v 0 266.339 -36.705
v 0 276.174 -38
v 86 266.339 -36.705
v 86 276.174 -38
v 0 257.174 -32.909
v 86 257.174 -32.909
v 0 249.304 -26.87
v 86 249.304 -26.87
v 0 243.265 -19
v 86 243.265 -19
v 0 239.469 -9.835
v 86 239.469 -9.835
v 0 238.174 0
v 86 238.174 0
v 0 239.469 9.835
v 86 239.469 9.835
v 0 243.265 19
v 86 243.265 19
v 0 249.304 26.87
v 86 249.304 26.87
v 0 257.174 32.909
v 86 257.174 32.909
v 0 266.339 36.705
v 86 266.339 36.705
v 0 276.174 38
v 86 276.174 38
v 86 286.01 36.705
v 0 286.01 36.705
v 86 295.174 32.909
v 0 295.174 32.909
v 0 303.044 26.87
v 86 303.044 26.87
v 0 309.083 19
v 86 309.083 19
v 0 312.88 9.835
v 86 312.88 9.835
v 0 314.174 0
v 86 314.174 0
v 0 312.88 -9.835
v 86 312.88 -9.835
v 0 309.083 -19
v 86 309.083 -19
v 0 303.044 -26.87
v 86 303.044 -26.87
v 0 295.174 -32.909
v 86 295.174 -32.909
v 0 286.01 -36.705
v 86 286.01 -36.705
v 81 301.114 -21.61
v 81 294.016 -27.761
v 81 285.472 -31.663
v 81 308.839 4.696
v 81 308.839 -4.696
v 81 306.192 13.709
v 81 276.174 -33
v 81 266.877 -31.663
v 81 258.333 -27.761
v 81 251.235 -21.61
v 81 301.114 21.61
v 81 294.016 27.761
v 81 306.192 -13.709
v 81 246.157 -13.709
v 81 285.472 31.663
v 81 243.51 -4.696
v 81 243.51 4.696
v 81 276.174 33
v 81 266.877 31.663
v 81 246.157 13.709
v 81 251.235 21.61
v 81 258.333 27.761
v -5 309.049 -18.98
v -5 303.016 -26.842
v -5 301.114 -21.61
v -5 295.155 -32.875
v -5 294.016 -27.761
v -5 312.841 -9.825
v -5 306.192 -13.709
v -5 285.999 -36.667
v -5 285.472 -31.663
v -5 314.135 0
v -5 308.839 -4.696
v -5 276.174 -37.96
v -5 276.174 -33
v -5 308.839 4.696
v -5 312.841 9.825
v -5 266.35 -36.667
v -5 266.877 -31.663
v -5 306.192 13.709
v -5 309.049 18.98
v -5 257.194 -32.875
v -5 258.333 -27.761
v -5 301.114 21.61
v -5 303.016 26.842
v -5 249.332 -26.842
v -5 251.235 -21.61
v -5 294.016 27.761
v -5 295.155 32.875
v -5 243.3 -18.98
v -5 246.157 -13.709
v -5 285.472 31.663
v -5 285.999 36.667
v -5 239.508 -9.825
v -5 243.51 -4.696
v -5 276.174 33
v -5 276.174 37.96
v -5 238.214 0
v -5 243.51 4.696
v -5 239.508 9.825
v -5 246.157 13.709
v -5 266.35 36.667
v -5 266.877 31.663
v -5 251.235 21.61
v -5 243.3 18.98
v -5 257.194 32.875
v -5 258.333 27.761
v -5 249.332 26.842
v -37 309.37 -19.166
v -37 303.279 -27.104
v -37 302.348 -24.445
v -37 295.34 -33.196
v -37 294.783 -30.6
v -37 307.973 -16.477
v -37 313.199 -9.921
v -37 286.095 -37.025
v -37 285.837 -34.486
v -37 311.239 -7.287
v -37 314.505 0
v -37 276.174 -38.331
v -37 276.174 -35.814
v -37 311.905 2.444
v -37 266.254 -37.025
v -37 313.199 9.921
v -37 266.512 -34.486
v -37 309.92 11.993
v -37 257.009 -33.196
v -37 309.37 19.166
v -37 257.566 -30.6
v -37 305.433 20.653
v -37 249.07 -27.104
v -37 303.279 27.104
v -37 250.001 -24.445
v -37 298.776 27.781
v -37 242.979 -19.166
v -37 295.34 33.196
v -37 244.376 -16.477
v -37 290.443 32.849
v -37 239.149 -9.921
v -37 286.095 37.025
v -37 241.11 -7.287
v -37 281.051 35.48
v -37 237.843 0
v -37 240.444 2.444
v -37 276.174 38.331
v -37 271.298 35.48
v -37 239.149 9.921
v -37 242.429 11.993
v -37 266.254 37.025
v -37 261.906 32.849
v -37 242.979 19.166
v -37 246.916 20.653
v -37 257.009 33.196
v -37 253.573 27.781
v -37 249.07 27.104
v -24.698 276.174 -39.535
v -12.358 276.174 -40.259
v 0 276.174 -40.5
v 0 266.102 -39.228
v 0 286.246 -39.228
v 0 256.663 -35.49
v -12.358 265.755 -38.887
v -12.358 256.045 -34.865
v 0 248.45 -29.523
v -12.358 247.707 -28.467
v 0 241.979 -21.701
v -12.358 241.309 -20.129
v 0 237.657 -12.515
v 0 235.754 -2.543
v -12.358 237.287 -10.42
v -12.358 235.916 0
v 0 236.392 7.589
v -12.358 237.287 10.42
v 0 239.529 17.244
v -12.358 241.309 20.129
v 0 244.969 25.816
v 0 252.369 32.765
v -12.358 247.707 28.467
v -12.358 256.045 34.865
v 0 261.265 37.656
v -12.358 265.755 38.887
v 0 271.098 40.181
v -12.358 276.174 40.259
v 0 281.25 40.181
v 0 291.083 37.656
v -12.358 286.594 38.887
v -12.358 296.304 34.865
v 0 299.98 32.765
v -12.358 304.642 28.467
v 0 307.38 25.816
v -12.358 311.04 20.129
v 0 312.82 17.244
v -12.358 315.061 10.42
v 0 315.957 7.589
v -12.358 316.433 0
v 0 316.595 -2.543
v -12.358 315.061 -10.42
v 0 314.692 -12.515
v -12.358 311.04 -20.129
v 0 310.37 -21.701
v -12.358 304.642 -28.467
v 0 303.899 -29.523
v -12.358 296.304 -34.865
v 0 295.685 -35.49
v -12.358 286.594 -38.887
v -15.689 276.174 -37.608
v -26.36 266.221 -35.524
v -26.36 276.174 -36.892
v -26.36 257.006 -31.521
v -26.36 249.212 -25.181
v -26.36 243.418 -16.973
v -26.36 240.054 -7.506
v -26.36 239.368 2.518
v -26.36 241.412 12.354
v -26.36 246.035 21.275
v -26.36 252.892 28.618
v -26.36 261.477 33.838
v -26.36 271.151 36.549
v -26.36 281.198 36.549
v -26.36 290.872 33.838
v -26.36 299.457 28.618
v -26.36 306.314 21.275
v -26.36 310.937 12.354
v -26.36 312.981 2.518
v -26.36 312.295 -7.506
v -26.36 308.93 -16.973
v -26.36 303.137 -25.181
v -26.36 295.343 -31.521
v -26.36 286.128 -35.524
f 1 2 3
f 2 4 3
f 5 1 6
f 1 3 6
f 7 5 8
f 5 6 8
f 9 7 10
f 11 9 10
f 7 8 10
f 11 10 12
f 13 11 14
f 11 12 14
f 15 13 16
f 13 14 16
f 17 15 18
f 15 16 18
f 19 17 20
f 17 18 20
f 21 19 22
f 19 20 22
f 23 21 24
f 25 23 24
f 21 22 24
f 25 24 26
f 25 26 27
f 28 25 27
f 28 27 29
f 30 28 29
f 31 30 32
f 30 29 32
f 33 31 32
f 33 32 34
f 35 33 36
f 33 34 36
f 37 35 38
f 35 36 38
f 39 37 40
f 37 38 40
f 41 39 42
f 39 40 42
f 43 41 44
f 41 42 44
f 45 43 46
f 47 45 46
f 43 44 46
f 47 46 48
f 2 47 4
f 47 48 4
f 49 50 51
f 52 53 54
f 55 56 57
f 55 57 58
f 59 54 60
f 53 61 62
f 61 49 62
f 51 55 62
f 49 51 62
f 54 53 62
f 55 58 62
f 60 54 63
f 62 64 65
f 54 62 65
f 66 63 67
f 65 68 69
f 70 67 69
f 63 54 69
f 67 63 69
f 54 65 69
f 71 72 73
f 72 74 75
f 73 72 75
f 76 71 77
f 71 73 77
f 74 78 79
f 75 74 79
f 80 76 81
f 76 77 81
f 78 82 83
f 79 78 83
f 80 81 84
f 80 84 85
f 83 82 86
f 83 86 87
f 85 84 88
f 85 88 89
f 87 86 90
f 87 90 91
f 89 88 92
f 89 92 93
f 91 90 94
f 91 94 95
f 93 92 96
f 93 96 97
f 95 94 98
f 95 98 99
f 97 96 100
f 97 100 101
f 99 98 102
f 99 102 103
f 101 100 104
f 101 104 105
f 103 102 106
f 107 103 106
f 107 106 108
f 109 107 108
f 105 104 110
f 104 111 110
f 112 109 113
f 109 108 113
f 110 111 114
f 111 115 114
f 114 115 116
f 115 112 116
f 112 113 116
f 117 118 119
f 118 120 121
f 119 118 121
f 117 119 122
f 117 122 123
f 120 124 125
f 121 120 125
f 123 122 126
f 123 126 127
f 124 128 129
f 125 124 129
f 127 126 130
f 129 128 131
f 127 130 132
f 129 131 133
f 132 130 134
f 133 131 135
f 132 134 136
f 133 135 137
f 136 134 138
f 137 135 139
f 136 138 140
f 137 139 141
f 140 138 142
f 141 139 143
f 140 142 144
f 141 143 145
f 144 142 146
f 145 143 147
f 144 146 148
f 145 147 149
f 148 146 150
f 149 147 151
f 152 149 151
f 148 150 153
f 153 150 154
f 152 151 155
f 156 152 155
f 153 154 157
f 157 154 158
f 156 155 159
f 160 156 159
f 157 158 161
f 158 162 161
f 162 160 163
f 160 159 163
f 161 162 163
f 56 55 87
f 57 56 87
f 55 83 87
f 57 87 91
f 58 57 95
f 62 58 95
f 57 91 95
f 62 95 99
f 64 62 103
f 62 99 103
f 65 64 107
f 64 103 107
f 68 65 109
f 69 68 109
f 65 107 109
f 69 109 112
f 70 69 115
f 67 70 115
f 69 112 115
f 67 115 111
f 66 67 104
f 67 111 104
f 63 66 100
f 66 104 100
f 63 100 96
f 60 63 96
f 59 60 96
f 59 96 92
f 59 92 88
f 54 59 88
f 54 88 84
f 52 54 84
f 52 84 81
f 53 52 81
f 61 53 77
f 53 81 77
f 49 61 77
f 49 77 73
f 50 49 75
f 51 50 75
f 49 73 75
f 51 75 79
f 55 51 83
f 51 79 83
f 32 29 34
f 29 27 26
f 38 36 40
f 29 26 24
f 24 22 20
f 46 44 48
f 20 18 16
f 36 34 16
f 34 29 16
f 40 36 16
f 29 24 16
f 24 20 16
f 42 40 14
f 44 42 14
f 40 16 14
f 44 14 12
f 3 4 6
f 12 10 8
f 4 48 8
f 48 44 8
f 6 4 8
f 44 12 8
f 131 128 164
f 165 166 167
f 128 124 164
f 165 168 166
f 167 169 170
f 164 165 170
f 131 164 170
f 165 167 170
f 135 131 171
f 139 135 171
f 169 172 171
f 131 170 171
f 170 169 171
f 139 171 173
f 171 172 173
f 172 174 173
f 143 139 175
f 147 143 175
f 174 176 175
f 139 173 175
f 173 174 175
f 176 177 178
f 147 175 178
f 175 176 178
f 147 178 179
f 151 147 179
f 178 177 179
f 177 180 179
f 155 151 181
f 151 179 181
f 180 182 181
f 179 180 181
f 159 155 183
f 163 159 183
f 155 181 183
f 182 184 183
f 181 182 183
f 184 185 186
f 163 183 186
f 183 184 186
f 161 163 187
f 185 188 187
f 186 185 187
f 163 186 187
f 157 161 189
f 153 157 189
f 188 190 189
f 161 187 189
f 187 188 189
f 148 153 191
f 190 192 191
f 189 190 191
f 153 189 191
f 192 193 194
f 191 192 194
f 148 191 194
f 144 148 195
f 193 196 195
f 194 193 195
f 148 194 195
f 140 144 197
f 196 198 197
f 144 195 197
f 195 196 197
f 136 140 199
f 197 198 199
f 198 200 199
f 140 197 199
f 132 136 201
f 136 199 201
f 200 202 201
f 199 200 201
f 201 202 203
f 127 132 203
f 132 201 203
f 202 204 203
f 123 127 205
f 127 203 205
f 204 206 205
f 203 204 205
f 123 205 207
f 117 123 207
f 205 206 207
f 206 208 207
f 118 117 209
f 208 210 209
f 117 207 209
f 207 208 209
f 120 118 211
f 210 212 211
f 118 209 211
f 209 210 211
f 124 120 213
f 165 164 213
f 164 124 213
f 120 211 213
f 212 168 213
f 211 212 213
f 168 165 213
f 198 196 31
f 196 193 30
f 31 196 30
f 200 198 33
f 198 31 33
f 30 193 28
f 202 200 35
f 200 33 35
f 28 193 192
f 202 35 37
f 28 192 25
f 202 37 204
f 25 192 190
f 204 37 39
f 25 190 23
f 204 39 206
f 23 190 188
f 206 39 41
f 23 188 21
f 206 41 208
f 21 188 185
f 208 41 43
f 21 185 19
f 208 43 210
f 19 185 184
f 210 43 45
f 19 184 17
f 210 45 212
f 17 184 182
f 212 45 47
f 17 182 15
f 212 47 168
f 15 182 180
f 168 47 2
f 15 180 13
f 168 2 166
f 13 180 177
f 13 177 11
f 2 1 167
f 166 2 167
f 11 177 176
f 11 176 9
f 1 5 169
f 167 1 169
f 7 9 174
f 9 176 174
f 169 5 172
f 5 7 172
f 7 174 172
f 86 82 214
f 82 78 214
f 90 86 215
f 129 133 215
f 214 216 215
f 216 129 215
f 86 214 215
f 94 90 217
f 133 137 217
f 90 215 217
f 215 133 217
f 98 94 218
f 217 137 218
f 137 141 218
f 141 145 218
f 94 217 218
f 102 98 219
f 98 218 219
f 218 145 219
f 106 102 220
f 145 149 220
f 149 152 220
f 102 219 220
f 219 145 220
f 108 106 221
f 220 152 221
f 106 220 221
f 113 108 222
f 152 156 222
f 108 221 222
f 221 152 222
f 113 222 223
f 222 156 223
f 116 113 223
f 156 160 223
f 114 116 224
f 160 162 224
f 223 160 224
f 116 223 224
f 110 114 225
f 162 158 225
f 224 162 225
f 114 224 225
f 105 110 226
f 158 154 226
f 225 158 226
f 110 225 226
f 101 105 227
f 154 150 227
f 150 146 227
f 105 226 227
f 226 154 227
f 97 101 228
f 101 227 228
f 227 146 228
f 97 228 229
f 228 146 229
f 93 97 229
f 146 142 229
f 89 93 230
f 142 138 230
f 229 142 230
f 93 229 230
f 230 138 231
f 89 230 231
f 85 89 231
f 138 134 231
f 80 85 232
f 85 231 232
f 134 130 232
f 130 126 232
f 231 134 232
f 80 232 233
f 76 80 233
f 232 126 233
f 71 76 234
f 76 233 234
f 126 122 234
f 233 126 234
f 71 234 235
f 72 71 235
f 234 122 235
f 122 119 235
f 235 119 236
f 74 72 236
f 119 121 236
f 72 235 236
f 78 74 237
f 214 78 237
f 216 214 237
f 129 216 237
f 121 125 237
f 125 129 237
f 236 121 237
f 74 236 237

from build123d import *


with BuildPart() as part:
    # Sketch1 → Revolve1 (revolve)
    with BuildSketch(Plane.XY, mode=Mode.PRIVATE) as revolve1_sk:
        with BuildLine():
            Line((0, 316.674418605), (0, 314.174418605))
            Line((0, 314.174418605), (86, 314.174418605))
            Line((86, 314.174418605), (86, 276.174418605))
            Line((86, 276.174418605), (81, 276.174418605))
            Line((81, 276.174418605), (81, 309.174418605))
            Line((81, 309.174418605), (-5, 309.174418605))
            Line((-5, 309.174418605), (-5, 314.134629268))
            ThreePointArc((-5, 314.134629268), (-21.02740861, 313.469956125), (-37, 311.988085198))
            Line((-37, 311.988085198), (-37, 314.505464815))
            ThreePointArc((-37, 314.505464815), (-18.53175896, 316.131715126), (0, 316.674418605))
        make_face()
    revolve(revolve1_sk.sketch.rotate(Axis((86, 276.174418605, 0), (-1, 0, 0)), 90), axis=Axis((86, 276.174418605, 0), (-1, 0, 0)))


solid = part.part
